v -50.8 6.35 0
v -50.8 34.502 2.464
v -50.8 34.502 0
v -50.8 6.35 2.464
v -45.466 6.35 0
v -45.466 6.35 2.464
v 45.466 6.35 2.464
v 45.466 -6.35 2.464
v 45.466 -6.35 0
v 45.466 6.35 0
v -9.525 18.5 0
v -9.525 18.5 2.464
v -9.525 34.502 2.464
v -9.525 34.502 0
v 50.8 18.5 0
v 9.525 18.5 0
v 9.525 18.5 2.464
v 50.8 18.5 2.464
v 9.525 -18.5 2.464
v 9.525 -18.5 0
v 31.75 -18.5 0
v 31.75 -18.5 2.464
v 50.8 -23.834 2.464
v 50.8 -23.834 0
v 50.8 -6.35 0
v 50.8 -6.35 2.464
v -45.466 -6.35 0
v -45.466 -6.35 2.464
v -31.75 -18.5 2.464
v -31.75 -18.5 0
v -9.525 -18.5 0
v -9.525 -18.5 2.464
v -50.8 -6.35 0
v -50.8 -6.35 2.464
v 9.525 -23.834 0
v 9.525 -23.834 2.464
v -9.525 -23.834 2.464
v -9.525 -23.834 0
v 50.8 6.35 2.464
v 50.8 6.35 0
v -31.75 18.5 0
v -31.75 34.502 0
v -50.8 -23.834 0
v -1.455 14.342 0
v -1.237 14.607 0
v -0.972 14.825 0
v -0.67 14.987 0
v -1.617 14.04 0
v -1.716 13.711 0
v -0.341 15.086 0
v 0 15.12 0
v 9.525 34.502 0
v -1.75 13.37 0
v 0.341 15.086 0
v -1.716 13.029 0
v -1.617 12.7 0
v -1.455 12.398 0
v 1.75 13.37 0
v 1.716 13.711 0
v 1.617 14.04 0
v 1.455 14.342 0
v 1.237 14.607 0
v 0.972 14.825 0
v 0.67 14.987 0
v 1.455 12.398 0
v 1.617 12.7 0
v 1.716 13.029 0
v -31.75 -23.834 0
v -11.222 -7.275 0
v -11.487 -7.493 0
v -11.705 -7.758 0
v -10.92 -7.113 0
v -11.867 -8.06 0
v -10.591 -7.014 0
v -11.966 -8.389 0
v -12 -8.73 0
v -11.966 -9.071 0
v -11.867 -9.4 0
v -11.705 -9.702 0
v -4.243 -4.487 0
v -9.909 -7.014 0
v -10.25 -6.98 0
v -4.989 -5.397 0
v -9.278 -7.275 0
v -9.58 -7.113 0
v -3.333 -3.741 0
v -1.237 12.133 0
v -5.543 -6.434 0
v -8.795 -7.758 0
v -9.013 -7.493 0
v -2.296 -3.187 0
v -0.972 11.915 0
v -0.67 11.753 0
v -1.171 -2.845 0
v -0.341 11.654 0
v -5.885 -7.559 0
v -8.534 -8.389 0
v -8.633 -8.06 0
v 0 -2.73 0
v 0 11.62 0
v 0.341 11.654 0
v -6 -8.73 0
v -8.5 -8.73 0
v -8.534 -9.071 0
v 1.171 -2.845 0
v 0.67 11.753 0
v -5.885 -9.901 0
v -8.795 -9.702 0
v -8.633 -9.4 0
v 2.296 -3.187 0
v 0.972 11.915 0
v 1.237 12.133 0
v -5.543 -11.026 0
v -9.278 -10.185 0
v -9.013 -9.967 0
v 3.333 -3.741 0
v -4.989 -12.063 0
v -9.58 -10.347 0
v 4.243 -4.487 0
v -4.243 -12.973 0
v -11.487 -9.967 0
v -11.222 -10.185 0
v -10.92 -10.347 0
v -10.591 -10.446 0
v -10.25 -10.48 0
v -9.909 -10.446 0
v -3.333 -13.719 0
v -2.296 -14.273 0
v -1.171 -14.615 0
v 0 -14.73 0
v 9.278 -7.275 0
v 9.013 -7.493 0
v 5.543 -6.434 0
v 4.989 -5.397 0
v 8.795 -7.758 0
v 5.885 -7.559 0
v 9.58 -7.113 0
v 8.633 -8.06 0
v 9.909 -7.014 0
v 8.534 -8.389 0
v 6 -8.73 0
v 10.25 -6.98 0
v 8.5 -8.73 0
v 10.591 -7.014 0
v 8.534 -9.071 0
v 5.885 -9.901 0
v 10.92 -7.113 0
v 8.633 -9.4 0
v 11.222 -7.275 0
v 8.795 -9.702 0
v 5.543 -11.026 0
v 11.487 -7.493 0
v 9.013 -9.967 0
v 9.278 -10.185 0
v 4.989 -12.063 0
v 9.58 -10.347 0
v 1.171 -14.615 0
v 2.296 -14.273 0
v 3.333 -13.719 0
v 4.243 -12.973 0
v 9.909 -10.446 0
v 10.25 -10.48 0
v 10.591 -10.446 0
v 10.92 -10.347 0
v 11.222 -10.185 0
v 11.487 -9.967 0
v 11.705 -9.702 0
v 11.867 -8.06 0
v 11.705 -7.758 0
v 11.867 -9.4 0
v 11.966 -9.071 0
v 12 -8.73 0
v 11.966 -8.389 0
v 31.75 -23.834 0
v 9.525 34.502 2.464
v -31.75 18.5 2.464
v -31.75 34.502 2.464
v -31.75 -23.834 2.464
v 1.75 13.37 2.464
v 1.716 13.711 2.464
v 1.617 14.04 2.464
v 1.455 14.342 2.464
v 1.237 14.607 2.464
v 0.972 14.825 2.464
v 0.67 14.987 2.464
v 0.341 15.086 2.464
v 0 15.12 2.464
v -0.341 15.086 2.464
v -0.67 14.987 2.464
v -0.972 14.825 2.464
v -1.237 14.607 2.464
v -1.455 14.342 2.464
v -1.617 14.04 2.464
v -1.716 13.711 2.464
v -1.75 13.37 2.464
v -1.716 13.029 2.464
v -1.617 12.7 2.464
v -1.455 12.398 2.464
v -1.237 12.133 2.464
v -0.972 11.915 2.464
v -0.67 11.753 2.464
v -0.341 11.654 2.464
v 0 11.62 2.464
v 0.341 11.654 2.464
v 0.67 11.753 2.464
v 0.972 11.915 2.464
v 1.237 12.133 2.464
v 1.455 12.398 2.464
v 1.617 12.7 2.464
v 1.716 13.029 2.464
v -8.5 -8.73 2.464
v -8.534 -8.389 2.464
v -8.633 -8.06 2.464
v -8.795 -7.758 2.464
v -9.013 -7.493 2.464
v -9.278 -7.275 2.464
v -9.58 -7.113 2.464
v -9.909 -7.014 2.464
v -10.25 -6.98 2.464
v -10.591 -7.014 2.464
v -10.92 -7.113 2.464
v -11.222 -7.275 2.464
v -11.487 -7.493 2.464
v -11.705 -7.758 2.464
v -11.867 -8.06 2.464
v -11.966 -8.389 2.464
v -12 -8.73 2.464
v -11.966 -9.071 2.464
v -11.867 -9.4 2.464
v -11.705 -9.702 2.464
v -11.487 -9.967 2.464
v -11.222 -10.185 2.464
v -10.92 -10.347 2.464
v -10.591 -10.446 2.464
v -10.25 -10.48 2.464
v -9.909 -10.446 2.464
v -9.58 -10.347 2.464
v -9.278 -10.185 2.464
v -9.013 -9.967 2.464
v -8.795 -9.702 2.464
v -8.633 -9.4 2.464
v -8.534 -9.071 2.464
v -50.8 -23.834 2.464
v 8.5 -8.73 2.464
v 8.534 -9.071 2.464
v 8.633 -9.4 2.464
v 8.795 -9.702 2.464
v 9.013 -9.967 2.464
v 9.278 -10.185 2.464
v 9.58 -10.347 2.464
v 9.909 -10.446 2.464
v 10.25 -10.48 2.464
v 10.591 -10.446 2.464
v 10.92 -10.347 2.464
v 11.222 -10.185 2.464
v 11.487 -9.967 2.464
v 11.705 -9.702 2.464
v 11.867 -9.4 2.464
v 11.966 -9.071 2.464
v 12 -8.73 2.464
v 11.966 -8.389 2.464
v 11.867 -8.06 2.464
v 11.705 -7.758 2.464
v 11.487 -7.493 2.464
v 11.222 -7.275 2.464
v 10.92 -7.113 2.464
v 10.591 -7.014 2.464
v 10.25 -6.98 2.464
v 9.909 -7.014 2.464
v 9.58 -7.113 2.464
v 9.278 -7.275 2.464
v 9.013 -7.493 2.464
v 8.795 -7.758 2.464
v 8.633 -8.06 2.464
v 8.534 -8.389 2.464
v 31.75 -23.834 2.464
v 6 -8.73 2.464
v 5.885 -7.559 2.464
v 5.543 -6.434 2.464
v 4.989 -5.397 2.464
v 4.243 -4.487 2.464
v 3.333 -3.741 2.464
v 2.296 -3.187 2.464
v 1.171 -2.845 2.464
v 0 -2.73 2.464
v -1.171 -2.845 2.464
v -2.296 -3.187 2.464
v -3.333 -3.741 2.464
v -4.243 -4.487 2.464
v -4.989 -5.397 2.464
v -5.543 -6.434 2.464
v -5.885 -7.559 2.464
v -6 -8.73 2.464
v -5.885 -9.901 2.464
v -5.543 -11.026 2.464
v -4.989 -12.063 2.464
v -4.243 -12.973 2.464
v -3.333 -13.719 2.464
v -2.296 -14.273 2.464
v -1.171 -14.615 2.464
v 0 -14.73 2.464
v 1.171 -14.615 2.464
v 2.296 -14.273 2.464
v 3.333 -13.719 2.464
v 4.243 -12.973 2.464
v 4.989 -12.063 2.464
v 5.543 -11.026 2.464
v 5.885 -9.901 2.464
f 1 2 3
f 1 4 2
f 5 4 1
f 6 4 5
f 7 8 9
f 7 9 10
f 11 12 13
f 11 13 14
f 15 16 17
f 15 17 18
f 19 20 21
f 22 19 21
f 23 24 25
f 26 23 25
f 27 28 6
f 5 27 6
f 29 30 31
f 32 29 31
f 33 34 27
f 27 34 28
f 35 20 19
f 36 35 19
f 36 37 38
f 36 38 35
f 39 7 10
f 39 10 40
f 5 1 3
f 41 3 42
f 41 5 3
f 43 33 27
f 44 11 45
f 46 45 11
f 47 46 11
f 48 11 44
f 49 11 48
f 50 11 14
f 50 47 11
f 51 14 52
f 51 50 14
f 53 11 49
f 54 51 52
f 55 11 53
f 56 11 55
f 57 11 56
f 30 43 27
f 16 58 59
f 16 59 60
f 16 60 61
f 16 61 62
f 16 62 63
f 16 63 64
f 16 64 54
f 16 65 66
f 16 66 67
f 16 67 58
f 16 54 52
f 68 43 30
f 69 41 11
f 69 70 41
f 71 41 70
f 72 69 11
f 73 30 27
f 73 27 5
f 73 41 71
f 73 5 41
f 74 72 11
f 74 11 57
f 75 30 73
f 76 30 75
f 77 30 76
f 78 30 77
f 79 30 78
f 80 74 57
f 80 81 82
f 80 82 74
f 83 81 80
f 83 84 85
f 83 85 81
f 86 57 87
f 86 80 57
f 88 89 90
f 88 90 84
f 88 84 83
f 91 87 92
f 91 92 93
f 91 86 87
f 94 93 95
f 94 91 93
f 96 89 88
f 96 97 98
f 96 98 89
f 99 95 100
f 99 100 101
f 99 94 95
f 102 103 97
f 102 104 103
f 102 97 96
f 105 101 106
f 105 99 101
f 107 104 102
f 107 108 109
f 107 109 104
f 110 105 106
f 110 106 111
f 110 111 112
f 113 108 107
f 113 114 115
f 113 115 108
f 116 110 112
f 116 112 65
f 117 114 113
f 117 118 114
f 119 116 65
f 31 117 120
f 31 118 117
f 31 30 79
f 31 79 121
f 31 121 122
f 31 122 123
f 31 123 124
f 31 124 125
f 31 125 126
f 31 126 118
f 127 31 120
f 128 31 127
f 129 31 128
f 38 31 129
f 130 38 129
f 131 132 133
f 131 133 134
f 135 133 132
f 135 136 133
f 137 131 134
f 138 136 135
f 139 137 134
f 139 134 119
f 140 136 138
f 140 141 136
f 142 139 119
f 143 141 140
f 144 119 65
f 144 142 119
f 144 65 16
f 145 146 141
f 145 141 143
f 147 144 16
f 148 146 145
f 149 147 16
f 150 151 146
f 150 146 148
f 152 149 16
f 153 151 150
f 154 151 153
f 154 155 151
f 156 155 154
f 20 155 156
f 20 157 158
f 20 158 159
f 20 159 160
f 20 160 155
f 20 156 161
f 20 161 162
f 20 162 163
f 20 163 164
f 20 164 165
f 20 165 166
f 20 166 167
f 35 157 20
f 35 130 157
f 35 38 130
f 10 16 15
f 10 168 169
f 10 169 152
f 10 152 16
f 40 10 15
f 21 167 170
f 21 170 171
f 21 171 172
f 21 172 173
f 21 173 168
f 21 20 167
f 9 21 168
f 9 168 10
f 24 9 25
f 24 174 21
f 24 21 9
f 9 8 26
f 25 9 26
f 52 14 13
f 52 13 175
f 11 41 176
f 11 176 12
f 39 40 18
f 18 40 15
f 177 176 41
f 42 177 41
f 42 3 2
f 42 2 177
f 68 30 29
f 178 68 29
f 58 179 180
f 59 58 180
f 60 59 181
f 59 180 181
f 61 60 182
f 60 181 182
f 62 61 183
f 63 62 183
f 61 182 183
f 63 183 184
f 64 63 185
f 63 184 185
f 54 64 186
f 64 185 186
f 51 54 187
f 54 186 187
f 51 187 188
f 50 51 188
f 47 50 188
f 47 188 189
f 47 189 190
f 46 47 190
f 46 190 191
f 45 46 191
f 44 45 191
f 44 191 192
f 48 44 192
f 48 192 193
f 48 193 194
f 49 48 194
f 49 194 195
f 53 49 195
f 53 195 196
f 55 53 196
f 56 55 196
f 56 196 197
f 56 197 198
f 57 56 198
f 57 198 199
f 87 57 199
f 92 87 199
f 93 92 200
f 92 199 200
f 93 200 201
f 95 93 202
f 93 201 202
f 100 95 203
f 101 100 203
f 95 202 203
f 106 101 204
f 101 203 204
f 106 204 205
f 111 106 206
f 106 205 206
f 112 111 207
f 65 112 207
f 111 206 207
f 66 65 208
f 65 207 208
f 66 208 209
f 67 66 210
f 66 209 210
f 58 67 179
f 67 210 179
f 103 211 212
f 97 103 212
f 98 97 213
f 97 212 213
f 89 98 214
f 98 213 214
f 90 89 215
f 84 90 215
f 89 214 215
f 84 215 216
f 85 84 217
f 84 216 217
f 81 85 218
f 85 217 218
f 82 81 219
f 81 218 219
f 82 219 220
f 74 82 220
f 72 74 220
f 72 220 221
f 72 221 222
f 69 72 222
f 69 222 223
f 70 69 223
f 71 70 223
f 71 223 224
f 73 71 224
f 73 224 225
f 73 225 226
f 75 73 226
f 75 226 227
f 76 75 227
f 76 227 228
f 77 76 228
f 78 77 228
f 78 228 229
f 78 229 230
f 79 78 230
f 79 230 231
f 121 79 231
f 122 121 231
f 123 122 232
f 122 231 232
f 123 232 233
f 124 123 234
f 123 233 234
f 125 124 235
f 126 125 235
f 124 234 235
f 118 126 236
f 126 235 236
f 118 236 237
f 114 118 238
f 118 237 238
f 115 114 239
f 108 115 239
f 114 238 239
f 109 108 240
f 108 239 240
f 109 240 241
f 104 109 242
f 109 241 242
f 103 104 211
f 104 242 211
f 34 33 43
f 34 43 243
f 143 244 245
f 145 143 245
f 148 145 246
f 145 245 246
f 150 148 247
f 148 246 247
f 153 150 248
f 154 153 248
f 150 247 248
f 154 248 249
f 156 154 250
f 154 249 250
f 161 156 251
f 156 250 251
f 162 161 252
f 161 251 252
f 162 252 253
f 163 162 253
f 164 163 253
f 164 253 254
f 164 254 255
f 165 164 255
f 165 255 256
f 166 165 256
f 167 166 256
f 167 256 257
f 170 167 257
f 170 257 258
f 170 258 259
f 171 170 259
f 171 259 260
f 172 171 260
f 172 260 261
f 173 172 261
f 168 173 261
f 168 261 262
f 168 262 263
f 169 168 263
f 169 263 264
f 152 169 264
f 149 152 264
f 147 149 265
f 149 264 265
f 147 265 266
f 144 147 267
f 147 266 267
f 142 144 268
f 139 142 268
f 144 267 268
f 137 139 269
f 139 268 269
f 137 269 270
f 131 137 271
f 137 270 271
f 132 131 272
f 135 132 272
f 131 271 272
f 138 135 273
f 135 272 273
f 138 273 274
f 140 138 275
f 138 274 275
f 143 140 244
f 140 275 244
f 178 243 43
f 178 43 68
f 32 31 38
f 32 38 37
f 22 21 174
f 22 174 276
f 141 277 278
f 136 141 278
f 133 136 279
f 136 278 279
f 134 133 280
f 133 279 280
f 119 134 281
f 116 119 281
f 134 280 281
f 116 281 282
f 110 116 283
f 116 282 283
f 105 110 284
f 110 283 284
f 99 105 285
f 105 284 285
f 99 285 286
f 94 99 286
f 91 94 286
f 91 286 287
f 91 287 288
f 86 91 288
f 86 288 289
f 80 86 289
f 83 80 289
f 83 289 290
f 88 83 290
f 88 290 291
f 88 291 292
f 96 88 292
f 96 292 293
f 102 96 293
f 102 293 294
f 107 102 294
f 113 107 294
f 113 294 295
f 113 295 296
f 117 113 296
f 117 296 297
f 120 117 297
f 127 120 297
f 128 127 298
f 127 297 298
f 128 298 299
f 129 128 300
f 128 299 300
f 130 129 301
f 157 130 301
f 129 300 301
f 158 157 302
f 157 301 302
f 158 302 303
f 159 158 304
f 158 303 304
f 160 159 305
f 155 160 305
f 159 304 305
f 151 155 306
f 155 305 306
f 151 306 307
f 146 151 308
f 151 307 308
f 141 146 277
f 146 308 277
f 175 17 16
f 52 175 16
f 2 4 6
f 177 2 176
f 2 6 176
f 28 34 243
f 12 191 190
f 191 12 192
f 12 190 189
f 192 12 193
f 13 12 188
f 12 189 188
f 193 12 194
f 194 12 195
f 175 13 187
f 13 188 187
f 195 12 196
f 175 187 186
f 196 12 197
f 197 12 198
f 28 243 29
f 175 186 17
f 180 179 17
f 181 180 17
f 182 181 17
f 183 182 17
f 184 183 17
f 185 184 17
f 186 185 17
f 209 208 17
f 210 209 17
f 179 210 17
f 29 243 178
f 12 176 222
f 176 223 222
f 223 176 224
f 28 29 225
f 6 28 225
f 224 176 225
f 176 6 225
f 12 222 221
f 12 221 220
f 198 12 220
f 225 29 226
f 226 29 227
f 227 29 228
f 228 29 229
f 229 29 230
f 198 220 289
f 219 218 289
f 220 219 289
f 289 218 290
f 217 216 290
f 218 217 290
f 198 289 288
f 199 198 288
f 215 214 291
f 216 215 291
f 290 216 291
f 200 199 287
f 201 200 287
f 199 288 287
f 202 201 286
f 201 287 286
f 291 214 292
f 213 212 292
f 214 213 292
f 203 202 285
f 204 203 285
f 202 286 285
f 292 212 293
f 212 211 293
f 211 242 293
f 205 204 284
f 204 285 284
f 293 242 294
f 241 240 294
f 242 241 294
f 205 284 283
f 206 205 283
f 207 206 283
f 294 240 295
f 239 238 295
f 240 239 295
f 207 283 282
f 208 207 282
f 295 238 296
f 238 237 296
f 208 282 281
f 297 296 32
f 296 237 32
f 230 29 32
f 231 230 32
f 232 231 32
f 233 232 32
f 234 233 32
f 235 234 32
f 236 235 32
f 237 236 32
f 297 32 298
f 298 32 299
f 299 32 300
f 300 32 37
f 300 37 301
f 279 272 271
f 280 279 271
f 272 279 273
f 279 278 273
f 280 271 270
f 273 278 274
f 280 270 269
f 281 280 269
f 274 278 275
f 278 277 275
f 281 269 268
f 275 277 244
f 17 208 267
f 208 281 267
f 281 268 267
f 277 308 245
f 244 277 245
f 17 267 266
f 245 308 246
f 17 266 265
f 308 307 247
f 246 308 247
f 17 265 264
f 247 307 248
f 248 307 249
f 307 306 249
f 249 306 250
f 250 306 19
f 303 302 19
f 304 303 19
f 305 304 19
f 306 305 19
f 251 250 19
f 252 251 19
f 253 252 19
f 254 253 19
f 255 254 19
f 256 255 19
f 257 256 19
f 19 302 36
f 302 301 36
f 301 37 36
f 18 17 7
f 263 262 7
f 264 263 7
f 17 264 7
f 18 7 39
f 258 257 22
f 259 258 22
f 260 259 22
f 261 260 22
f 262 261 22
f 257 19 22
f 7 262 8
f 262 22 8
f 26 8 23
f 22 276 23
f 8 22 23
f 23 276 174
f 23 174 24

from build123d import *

# Parameters (mm, degrees)
SKETCH1_W           = 101.6
SKETCH1_H           = 36.999999914
BOSS_EXTRUDE1_DEPTH = 2.4638
SKETCH2_R           = 5.999999938
SKETCH2_R_2         = 1.750000056
MOTORHOLES_DEPTH    = 55.119869816
SKETCH3_W           = 19.05
SKETCH3_H           = 2.4638
BOTTOMTEETH_DEPTH   = 5.334
SKETCH4_W           = 10.668
SKETCH4_H           = 12.7
CUT_EXTRUDE2_DEPTH  = 57.167338057
SKETCH5_W           = 19.05
SKETCH5_H           = 2.4638
TOPTEETH_DEPTH      = 16.002


with BuildPart() as part:
    # Sketch1 → Boss-Extrude1 (new body)
    with BuildSketch(Plane.XY):
        Rectangle(SKETCH1_W, SKETCH1_H)
    extrude(amount=BOSS_EXTRUDE1_DEPTH)

    # Sketch2 → MotorHoles (cut, through all)
    with BuildSketch(Plane.XY.offset(2.4638)):
        with Locations((0, -8.730000066)):
            Circle(SKETCH2_R)
        with Locations((-10.250000074, -8.730000066)):
            Circle(SKETCH2_R_2)
        with Locations((0, 13.36999993)):
            Circle(SKETCH2_R_2)
        with Locations(Location((10.250000074, -8.730000066, 0), (0, 0, 180))):
            Circle(SKETCH2_R_2)
    extrude(amount=-MOTORHOLES_DEPTH, mode=Mode.SUBTRACT)

    # Sketch3 → BottomTeeth (add)
    with BuildSketch(Plane.XZ.offset(18.499999957)):
        with Locations((-41.275, 1.2319)):
            Rectangle(SKETCH3_W, SKETCH3_H)
        with Locations((41.275, 1.2319)):
            Rectangle(SKETCH3_W, SKETCH3_H)
        with Locations((0, 1.2319)):
            Rectangle(SKETCH3_W, SKETCH3_H)
    extrude(amount=BOTTOMTEETH_DEPTH)

    # Sketch4 → Cut-Extrude2 (cut, through all)
    with BuildSketch(Plane.XY.offset(2.4638)):
        with Locations((-50.8, 0)):
            Rectangle(SKETCH4_W, SKETCH4_H)
        with Locations((50.8, 0)):
            Rectangle(SKETCH4_W, SKETCH4_H)
    extrude(amount=-CUT_EXTRUDE2_DEPTH, mode=Mode.SUBTRACT)

    # Sketch5 → TopTeeth (add)
    with BuildSketch(Plane(origin=(0, 18.499999957, 0), x_dir=(1, 0, 0), z_dir=(0, 1, 0))):
        with Locations((-41.275, -1.2319)):
            Rectangle(SKETCH5_W, SKETCH5_H)
        with Locations((0, -1.2319)):
            Rectangle(SKETCH5_W, SKETCH5_H)
    extrude(amount=TOPTEETH_DEPTH)


solid = part.part
